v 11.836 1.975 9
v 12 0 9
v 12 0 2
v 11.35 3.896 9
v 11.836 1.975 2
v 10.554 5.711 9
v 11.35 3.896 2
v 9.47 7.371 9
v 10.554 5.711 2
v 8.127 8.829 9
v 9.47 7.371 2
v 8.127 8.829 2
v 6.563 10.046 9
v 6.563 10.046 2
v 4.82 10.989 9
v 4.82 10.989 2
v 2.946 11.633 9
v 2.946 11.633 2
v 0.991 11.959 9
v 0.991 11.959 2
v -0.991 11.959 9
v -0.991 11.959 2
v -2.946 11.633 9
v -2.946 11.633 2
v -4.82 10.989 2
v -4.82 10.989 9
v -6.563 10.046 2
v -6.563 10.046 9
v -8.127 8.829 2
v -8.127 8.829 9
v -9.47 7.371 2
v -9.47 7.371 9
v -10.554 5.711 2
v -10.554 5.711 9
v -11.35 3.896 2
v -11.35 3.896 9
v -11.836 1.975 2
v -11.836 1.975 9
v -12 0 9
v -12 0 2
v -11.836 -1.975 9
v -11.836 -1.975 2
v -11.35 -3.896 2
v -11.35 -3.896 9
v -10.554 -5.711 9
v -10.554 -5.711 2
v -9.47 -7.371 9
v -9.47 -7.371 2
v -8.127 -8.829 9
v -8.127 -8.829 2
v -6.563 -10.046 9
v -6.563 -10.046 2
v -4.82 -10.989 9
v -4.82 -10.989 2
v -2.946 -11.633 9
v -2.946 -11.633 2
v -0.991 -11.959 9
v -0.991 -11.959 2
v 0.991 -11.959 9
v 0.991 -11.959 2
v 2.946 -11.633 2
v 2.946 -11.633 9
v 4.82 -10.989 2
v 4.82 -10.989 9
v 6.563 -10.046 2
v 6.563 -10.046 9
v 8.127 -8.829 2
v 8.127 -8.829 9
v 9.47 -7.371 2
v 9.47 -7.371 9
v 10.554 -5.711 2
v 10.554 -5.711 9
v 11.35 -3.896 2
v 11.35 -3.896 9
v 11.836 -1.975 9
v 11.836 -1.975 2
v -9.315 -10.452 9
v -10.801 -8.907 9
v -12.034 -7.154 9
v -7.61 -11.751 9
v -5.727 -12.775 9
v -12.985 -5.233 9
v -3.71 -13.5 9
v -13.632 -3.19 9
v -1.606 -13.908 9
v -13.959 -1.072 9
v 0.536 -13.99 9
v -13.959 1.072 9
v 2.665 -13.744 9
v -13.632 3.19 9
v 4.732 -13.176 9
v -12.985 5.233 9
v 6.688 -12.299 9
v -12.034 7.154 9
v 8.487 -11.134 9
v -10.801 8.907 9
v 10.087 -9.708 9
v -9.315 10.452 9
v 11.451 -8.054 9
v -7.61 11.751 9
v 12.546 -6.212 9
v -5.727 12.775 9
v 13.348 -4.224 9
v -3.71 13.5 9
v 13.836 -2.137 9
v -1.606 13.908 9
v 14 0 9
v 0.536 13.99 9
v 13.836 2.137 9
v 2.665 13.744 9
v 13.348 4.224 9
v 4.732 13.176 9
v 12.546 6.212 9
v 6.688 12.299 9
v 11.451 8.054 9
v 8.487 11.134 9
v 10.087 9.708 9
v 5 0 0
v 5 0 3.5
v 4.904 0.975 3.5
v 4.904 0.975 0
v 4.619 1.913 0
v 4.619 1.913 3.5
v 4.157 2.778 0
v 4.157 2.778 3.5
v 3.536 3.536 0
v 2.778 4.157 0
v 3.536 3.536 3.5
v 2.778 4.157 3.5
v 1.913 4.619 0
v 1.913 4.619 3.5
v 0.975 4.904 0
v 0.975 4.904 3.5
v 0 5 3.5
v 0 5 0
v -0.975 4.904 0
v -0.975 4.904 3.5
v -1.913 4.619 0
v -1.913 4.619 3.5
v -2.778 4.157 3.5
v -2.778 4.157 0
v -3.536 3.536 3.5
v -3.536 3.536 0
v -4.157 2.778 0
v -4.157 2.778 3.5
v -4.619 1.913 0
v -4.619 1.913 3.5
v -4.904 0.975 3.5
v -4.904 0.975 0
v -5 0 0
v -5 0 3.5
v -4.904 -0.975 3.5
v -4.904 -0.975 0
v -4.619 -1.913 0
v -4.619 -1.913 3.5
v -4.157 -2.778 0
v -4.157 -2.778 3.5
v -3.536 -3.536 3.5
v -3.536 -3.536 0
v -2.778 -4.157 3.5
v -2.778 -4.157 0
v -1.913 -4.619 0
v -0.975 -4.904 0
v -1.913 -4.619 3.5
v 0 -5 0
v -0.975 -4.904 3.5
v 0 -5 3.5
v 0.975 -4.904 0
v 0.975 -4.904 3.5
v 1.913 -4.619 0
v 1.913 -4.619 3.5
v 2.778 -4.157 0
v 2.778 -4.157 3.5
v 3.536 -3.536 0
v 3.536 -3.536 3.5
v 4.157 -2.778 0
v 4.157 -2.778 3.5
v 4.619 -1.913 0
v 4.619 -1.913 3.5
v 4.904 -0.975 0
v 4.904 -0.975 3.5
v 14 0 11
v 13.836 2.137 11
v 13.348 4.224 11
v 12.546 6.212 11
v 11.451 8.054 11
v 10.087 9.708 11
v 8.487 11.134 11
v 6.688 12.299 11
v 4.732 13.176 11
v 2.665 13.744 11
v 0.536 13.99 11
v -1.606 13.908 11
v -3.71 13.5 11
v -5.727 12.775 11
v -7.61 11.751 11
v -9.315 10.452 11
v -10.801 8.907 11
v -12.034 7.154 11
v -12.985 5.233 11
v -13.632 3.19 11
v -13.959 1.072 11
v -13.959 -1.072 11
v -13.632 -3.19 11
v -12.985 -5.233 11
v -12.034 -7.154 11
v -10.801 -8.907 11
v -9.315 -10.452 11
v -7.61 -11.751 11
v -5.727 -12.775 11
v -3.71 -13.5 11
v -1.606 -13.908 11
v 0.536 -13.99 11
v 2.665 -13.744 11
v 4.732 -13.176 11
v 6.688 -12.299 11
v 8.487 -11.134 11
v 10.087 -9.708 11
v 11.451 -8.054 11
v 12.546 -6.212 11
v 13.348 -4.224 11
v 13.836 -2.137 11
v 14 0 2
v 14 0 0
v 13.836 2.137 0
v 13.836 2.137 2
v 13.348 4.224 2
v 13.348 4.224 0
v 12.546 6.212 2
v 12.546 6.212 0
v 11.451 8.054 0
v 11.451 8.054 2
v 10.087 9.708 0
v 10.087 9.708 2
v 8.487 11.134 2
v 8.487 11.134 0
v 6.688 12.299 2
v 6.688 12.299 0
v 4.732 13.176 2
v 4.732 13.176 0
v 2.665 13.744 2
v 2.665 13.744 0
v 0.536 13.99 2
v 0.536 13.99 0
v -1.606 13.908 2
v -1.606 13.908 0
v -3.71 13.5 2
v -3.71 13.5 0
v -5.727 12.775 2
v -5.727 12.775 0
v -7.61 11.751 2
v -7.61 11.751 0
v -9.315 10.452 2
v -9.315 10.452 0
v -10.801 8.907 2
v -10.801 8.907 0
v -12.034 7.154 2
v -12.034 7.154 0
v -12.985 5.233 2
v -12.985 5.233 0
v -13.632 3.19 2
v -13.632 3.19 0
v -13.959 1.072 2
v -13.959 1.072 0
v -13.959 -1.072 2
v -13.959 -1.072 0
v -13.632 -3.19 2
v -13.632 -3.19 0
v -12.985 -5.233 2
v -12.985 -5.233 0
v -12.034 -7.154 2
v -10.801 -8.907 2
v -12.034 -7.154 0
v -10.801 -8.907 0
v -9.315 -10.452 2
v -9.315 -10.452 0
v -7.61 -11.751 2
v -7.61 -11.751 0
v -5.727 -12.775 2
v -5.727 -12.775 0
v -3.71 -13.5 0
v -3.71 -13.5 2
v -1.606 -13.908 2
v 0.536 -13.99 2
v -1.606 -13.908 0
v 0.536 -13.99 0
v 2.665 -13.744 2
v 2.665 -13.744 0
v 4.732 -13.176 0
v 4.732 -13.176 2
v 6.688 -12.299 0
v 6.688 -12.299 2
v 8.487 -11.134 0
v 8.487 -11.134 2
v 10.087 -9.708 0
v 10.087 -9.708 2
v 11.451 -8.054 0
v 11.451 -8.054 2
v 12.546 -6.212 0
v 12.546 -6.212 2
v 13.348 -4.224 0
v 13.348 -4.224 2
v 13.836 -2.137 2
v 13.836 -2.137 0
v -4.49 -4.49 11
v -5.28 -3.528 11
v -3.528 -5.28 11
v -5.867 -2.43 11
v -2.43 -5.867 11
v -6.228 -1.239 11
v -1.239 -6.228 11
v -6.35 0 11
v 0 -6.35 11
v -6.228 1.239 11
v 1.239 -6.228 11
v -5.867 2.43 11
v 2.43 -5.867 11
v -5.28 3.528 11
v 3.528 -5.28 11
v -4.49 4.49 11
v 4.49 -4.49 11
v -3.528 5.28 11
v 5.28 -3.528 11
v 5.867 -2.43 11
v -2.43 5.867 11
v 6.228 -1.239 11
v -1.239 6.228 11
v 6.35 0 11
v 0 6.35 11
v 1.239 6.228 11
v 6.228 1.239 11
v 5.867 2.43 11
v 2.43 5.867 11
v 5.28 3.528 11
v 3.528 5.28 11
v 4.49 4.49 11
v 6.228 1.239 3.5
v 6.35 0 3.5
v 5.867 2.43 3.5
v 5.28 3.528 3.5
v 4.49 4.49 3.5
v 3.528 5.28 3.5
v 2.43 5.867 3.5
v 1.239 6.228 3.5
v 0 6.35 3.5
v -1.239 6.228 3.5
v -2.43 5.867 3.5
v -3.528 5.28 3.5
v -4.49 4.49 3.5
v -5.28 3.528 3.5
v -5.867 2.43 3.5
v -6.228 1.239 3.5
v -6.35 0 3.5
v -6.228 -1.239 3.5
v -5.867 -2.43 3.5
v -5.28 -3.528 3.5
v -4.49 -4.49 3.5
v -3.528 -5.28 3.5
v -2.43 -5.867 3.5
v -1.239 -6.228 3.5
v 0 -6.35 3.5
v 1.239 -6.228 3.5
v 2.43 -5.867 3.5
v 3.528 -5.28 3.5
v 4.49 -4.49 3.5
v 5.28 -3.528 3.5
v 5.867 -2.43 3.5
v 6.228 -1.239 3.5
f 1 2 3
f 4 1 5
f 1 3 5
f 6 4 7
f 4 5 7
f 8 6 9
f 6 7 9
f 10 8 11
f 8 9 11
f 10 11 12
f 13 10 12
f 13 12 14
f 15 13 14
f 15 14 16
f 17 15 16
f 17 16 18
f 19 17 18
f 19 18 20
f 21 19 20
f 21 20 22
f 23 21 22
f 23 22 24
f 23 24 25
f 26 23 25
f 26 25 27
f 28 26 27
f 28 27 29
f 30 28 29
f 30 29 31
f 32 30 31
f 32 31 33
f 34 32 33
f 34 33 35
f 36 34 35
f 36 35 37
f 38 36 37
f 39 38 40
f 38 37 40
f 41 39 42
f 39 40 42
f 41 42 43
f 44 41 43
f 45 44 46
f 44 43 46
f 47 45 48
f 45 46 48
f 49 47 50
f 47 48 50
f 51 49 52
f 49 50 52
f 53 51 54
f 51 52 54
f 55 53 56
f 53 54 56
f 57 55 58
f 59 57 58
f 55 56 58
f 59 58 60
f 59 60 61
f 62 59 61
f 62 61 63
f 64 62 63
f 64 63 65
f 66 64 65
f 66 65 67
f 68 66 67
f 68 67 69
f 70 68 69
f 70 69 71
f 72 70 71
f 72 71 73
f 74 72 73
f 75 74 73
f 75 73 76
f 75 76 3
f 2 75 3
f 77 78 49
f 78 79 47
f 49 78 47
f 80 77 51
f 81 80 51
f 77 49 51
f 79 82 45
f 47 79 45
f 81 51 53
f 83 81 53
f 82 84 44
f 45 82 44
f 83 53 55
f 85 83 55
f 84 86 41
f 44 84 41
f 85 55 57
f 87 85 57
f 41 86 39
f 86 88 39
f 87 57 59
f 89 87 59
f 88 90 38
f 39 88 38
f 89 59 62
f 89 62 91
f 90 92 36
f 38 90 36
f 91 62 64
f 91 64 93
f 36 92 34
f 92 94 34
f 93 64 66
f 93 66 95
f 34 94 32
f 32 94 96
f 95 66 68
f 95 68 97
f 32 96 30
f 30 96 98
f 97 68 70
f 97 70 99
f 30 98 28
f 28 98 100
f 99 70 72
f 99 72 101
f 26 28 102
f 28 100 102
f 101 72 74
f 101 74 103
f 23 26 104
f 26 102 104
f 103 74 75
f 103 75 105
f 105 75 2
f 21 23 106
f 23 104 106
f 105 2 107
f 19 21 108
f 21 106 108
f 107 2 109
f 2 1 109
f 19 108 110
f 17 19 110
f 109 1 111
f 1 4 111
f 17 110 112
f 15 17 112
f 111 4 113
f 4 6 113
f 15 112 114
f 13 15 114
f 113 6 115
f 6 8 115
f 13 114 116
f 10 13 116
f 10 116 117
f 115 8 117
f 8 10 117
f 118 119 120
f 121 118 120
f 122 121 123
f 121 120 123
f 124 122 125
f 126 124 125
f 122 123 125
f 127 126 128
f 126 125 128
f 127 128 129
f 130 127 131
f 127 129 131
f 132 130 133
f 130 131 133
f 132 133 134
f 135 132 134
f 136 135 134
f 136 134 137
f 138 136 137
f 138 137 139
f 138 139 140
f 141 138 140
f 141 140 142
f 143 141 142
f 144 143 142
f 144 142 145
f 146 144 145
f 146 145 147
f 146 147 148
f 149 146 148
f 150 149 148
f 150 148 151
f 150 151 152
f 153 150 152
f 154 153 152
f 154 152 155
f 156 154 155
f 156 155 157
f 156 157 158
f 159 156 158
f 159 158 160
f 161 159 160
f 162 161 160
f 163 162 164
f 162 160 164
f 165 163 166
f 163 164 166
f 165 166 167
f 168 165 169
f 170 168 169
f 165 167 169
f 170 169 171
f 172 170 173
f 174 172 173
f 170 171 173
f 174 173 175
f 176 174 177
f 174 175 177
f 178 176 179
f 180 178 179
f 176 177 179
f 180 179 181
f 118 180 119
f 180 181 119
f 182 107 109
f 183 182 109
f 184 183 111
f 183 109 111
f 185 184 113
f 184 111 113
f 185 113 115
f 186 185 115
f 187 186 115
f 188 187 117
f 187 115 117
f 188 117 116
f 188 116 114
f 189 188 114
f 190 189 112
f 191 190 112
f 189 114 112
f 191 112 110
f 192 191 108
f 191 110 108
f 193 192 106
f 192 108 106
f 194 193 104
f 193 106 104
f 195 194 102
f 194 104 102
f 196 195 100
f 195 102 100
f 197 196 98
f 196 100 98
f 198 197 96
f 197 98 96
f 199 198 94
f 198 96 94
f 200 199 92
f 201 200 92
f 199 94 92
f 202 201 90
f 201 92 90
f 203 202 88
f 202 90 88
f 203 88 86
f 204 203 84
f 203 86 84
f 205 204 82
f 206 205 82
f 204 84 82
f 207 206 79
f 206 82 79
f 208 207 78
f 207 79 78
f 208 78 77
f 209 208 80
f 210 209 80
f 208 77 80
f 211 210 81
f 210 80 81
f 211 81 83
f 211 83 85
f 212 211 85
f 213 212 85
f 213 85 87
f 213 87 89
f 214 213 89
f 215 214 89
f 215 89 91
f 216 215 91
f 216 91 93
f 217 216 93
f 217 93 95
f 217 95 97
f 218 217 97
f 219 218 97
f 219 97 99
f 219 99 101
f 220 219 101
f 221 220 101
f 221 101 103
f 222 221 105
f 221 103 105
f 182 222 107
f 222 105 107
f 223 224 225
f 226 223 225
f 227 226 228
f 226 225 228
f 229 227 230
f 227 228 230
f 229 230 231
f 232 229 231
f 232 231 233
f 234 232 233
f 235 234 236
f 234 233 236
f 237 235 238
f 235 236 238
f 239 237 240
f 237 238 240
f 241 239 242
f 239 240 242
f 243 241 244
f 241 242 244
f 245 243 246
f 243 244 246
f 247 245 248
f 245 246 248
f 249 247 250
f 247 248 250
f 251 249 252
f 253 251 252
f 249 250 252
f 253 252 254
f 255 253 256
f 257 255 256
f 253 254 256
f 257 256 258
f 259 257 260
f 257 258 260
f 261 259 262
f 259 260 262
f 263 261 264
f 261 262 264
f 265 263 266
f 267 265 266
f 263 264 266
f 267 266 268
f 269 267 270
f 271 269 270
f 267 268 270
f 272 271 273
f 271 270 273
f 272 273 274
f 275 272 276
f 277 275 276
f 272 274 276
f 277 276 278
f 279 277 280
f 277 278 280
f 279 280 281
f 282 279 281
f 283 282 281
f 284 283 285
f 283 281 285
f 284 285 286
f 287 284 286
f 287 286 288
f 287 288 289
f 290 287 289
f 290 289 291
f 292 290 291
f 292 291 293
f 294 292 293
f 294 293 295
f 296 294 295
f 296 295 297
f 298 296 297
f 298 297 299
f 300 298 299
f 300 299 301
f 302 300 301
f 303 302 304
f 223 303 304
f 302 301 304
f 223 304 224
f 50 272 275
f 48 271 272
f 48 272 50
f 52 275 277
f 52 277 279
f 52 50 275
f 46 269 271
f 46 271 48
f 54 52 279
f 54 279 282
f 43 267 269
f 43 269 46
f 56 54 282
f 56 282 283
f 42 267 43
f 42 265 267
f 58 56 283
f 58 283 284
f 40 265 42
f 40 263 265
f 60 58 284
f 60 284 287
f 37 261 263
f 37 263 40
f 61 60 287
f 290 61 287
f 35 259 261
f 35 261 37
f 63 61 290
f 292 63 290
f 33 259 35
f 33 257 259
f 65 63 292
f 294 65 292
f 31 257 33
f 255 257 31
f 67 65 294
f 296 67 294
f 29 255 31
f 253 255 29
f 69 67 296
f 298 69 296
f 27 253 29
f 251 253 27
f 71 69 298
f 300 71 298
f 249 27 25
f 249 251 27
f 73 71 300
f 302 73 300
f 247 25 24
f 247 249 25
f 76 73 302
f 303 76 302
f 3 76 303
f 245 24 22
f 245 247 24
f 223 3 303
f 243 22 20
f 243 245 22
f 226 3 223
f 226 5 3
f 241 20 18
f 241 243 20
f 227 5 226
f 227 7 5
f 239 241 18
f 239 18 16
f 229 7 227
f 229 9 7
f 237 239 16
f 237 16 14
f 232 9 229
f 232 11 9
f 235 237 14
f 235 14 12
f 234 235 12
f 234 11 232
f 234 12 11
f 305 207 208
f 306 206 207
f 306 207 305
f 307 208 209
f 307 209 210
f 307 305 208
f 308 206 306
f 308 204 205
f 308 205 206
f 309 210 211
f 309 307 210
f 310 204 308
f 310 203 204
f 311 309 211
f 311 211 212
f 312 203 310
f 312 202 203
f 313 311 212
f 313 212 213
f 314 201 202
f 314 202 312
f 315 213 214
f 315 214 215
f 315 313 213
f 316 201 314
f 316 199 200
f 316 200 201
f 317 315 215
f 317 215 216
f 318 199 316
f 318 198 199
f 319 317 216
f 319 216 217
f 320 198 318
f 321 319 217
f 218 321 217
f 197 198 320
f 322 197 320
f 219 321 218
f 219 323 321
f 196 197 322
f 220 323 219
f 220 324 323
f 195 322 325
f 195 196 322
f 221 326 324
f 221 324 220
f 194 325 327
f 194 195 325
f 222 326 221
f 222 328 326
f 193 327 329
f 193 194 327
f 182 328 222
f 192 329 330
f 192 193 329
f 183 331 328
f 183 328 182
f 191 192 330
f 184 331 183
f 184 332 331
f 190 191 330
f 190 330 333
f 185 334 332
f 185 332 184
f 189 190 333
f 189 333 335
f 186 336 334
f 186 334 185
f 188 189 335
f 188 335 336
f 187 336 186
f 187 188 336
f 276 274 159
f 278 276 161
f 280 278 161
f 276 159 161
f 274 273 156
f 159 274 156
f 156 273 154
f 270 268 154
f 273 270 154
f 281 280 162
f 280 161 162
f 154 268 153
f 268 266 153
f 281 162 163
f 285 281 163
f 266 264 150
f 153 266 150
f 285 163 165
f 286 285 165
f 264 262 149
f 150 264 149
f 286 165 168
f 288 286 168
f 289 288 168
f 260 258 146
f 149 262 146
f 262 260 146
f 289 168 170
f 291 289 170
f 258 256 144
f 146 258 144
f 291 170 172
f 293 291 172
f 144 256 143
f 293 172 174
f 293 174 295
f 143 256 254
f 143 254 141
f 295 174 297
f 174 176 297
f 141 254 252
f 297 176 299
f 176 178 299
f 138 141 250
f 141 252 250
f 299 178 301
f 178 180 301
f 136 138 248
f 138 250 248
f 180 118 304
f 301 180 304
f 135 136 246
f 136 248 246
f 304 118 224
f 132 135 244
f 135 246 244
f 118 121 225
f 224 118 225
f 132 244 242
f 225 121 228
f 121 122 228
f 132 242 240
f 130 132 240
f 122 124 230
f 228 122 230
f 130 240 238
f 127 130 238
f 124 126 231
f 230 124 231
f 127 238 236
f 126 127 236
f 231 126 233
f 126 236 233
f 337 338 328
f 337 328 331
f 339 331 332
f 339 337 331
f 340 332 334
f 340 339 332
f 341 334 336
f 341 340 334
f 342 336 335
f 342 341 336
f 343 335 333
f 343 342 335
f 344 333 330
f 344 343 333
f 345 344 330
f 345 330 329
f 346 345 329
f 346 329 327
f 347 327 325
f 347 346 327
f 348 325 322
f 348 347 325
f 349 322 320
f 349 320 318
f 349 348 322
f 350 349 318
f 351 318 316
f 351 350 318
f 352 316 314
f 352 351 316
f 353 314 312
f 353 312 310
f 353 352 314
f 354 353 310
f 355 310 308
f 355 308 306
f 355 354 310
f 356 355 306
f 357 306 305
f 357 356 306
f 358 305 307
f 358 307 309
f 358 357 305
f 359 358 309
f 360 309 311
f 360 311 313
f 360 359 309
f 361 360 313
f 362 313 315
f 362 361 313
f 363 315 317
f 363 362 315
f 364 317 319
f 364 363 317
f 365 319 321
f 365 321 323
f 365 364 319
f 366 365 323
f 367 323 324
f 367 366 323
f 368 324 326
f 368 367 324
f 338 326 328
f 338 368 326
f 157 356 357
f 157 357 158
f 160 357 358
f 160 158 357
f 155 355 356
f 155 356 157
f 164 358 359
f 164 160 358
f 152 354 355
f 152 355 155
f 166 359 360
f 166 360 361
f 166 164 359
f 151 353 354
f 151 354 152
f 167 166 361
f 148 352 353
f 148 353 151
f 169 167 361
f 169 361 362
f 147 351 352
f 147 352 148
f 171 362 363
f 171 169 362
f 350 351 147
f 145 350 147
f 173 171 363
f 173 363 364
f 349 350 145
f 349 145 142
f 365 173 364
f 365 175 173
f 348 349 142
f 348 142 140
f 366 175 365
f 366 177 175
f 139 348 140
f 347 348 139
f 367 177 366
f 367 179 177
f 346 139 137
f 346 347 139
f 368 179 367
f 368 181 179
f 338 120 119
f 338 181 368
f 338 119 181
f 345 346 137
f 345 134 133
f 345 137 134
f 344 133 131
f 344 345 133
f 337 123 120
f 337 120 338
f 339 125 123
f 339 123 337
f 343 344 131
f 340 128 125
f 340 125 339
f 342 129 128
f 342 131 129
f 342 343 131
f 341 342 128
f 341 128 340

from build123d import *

# Parameters (mm, degrees)
SKETCH1_R            = 14
SKETCH1_R_2          = 2
TOP_FLANGE_DEPTH     = 2
SKETCH1_3_R          = 12
SKETCH1_3_R_2        = 2
CENTER_SPINDLE_DEPTH = 9
BOTTOM_START         = 9
SKETCH1_4_R          = 14
SKETCH1_4_R_2        = 2
BOTTOM_FLANGE_DEPTH  = 2
BEARING_START        = -7.5
SKETCH2_R            = 6.35
SKETCH2_R_2          = 2
BEARING_RECESS_DEPTH = 7.5
SKETCH2_3_R          = 5
SKETCH2_3_R_2        = 2
SCREW_OPENING_DEPTH  = 23.649503306


with BuildPart() as part:
    # Sketch1 → Top Flange (new body)
    with BuildSketch(Plane.XY):
        Circle(SKETCH1_R)
        Circle(SKETCH1_R_2, mode=Mode.SUBTRACT)
    extrude(amount=TOP_FLANGE_DEPTH)

    # Sketch1<3> → Center Spindle (add)
    with BuildSketch(Plane.XY):
        Circle(SKETCH1_3_R)
        Circle(SKETCH1_3_R_2, mode=Mode.SUBTRACT)
    extrude(amount=CENTER_SPINDLE_DEPTH)

    # Sketch1<4> → Bottom Flange (add)
    with BuildSketch(Plane.XY.offset(BOTTOM_START)):
        Circle(SKETCH1_4_R)
        Circle(SKETCH1_4_R_2, mode=Mode.SUBTRACT)
    extrude(amount=BOTTOM_FLANGE_DEPTH)

    # Sketch2 → Bearing Recess (cut)
    with BuildSketch(Plane.XY.offset(11).offset(BEARING_START)):
        Circle(SKETCH2_R)
        Circle(SKETCH2_R_2, mode=Mode.SUBTRACT)
    extrude(amount=BEARING_RECESS_DEPTH, mode=Mode.SUBTRACT)

    # Sketch2<3> → Screw Opening (cut, through all)
    with BuildSketch(Plane.XY.offset(11)):
        Circle(SKETCH2_3_R)
        Circle(SKETCH2_3_R_2, mode=Mode.SUBTRACT)
    extrude(amount=-SCREW_OPENING_DEPTH, mode=Mode.SUBTRACT)


solid = part.part
